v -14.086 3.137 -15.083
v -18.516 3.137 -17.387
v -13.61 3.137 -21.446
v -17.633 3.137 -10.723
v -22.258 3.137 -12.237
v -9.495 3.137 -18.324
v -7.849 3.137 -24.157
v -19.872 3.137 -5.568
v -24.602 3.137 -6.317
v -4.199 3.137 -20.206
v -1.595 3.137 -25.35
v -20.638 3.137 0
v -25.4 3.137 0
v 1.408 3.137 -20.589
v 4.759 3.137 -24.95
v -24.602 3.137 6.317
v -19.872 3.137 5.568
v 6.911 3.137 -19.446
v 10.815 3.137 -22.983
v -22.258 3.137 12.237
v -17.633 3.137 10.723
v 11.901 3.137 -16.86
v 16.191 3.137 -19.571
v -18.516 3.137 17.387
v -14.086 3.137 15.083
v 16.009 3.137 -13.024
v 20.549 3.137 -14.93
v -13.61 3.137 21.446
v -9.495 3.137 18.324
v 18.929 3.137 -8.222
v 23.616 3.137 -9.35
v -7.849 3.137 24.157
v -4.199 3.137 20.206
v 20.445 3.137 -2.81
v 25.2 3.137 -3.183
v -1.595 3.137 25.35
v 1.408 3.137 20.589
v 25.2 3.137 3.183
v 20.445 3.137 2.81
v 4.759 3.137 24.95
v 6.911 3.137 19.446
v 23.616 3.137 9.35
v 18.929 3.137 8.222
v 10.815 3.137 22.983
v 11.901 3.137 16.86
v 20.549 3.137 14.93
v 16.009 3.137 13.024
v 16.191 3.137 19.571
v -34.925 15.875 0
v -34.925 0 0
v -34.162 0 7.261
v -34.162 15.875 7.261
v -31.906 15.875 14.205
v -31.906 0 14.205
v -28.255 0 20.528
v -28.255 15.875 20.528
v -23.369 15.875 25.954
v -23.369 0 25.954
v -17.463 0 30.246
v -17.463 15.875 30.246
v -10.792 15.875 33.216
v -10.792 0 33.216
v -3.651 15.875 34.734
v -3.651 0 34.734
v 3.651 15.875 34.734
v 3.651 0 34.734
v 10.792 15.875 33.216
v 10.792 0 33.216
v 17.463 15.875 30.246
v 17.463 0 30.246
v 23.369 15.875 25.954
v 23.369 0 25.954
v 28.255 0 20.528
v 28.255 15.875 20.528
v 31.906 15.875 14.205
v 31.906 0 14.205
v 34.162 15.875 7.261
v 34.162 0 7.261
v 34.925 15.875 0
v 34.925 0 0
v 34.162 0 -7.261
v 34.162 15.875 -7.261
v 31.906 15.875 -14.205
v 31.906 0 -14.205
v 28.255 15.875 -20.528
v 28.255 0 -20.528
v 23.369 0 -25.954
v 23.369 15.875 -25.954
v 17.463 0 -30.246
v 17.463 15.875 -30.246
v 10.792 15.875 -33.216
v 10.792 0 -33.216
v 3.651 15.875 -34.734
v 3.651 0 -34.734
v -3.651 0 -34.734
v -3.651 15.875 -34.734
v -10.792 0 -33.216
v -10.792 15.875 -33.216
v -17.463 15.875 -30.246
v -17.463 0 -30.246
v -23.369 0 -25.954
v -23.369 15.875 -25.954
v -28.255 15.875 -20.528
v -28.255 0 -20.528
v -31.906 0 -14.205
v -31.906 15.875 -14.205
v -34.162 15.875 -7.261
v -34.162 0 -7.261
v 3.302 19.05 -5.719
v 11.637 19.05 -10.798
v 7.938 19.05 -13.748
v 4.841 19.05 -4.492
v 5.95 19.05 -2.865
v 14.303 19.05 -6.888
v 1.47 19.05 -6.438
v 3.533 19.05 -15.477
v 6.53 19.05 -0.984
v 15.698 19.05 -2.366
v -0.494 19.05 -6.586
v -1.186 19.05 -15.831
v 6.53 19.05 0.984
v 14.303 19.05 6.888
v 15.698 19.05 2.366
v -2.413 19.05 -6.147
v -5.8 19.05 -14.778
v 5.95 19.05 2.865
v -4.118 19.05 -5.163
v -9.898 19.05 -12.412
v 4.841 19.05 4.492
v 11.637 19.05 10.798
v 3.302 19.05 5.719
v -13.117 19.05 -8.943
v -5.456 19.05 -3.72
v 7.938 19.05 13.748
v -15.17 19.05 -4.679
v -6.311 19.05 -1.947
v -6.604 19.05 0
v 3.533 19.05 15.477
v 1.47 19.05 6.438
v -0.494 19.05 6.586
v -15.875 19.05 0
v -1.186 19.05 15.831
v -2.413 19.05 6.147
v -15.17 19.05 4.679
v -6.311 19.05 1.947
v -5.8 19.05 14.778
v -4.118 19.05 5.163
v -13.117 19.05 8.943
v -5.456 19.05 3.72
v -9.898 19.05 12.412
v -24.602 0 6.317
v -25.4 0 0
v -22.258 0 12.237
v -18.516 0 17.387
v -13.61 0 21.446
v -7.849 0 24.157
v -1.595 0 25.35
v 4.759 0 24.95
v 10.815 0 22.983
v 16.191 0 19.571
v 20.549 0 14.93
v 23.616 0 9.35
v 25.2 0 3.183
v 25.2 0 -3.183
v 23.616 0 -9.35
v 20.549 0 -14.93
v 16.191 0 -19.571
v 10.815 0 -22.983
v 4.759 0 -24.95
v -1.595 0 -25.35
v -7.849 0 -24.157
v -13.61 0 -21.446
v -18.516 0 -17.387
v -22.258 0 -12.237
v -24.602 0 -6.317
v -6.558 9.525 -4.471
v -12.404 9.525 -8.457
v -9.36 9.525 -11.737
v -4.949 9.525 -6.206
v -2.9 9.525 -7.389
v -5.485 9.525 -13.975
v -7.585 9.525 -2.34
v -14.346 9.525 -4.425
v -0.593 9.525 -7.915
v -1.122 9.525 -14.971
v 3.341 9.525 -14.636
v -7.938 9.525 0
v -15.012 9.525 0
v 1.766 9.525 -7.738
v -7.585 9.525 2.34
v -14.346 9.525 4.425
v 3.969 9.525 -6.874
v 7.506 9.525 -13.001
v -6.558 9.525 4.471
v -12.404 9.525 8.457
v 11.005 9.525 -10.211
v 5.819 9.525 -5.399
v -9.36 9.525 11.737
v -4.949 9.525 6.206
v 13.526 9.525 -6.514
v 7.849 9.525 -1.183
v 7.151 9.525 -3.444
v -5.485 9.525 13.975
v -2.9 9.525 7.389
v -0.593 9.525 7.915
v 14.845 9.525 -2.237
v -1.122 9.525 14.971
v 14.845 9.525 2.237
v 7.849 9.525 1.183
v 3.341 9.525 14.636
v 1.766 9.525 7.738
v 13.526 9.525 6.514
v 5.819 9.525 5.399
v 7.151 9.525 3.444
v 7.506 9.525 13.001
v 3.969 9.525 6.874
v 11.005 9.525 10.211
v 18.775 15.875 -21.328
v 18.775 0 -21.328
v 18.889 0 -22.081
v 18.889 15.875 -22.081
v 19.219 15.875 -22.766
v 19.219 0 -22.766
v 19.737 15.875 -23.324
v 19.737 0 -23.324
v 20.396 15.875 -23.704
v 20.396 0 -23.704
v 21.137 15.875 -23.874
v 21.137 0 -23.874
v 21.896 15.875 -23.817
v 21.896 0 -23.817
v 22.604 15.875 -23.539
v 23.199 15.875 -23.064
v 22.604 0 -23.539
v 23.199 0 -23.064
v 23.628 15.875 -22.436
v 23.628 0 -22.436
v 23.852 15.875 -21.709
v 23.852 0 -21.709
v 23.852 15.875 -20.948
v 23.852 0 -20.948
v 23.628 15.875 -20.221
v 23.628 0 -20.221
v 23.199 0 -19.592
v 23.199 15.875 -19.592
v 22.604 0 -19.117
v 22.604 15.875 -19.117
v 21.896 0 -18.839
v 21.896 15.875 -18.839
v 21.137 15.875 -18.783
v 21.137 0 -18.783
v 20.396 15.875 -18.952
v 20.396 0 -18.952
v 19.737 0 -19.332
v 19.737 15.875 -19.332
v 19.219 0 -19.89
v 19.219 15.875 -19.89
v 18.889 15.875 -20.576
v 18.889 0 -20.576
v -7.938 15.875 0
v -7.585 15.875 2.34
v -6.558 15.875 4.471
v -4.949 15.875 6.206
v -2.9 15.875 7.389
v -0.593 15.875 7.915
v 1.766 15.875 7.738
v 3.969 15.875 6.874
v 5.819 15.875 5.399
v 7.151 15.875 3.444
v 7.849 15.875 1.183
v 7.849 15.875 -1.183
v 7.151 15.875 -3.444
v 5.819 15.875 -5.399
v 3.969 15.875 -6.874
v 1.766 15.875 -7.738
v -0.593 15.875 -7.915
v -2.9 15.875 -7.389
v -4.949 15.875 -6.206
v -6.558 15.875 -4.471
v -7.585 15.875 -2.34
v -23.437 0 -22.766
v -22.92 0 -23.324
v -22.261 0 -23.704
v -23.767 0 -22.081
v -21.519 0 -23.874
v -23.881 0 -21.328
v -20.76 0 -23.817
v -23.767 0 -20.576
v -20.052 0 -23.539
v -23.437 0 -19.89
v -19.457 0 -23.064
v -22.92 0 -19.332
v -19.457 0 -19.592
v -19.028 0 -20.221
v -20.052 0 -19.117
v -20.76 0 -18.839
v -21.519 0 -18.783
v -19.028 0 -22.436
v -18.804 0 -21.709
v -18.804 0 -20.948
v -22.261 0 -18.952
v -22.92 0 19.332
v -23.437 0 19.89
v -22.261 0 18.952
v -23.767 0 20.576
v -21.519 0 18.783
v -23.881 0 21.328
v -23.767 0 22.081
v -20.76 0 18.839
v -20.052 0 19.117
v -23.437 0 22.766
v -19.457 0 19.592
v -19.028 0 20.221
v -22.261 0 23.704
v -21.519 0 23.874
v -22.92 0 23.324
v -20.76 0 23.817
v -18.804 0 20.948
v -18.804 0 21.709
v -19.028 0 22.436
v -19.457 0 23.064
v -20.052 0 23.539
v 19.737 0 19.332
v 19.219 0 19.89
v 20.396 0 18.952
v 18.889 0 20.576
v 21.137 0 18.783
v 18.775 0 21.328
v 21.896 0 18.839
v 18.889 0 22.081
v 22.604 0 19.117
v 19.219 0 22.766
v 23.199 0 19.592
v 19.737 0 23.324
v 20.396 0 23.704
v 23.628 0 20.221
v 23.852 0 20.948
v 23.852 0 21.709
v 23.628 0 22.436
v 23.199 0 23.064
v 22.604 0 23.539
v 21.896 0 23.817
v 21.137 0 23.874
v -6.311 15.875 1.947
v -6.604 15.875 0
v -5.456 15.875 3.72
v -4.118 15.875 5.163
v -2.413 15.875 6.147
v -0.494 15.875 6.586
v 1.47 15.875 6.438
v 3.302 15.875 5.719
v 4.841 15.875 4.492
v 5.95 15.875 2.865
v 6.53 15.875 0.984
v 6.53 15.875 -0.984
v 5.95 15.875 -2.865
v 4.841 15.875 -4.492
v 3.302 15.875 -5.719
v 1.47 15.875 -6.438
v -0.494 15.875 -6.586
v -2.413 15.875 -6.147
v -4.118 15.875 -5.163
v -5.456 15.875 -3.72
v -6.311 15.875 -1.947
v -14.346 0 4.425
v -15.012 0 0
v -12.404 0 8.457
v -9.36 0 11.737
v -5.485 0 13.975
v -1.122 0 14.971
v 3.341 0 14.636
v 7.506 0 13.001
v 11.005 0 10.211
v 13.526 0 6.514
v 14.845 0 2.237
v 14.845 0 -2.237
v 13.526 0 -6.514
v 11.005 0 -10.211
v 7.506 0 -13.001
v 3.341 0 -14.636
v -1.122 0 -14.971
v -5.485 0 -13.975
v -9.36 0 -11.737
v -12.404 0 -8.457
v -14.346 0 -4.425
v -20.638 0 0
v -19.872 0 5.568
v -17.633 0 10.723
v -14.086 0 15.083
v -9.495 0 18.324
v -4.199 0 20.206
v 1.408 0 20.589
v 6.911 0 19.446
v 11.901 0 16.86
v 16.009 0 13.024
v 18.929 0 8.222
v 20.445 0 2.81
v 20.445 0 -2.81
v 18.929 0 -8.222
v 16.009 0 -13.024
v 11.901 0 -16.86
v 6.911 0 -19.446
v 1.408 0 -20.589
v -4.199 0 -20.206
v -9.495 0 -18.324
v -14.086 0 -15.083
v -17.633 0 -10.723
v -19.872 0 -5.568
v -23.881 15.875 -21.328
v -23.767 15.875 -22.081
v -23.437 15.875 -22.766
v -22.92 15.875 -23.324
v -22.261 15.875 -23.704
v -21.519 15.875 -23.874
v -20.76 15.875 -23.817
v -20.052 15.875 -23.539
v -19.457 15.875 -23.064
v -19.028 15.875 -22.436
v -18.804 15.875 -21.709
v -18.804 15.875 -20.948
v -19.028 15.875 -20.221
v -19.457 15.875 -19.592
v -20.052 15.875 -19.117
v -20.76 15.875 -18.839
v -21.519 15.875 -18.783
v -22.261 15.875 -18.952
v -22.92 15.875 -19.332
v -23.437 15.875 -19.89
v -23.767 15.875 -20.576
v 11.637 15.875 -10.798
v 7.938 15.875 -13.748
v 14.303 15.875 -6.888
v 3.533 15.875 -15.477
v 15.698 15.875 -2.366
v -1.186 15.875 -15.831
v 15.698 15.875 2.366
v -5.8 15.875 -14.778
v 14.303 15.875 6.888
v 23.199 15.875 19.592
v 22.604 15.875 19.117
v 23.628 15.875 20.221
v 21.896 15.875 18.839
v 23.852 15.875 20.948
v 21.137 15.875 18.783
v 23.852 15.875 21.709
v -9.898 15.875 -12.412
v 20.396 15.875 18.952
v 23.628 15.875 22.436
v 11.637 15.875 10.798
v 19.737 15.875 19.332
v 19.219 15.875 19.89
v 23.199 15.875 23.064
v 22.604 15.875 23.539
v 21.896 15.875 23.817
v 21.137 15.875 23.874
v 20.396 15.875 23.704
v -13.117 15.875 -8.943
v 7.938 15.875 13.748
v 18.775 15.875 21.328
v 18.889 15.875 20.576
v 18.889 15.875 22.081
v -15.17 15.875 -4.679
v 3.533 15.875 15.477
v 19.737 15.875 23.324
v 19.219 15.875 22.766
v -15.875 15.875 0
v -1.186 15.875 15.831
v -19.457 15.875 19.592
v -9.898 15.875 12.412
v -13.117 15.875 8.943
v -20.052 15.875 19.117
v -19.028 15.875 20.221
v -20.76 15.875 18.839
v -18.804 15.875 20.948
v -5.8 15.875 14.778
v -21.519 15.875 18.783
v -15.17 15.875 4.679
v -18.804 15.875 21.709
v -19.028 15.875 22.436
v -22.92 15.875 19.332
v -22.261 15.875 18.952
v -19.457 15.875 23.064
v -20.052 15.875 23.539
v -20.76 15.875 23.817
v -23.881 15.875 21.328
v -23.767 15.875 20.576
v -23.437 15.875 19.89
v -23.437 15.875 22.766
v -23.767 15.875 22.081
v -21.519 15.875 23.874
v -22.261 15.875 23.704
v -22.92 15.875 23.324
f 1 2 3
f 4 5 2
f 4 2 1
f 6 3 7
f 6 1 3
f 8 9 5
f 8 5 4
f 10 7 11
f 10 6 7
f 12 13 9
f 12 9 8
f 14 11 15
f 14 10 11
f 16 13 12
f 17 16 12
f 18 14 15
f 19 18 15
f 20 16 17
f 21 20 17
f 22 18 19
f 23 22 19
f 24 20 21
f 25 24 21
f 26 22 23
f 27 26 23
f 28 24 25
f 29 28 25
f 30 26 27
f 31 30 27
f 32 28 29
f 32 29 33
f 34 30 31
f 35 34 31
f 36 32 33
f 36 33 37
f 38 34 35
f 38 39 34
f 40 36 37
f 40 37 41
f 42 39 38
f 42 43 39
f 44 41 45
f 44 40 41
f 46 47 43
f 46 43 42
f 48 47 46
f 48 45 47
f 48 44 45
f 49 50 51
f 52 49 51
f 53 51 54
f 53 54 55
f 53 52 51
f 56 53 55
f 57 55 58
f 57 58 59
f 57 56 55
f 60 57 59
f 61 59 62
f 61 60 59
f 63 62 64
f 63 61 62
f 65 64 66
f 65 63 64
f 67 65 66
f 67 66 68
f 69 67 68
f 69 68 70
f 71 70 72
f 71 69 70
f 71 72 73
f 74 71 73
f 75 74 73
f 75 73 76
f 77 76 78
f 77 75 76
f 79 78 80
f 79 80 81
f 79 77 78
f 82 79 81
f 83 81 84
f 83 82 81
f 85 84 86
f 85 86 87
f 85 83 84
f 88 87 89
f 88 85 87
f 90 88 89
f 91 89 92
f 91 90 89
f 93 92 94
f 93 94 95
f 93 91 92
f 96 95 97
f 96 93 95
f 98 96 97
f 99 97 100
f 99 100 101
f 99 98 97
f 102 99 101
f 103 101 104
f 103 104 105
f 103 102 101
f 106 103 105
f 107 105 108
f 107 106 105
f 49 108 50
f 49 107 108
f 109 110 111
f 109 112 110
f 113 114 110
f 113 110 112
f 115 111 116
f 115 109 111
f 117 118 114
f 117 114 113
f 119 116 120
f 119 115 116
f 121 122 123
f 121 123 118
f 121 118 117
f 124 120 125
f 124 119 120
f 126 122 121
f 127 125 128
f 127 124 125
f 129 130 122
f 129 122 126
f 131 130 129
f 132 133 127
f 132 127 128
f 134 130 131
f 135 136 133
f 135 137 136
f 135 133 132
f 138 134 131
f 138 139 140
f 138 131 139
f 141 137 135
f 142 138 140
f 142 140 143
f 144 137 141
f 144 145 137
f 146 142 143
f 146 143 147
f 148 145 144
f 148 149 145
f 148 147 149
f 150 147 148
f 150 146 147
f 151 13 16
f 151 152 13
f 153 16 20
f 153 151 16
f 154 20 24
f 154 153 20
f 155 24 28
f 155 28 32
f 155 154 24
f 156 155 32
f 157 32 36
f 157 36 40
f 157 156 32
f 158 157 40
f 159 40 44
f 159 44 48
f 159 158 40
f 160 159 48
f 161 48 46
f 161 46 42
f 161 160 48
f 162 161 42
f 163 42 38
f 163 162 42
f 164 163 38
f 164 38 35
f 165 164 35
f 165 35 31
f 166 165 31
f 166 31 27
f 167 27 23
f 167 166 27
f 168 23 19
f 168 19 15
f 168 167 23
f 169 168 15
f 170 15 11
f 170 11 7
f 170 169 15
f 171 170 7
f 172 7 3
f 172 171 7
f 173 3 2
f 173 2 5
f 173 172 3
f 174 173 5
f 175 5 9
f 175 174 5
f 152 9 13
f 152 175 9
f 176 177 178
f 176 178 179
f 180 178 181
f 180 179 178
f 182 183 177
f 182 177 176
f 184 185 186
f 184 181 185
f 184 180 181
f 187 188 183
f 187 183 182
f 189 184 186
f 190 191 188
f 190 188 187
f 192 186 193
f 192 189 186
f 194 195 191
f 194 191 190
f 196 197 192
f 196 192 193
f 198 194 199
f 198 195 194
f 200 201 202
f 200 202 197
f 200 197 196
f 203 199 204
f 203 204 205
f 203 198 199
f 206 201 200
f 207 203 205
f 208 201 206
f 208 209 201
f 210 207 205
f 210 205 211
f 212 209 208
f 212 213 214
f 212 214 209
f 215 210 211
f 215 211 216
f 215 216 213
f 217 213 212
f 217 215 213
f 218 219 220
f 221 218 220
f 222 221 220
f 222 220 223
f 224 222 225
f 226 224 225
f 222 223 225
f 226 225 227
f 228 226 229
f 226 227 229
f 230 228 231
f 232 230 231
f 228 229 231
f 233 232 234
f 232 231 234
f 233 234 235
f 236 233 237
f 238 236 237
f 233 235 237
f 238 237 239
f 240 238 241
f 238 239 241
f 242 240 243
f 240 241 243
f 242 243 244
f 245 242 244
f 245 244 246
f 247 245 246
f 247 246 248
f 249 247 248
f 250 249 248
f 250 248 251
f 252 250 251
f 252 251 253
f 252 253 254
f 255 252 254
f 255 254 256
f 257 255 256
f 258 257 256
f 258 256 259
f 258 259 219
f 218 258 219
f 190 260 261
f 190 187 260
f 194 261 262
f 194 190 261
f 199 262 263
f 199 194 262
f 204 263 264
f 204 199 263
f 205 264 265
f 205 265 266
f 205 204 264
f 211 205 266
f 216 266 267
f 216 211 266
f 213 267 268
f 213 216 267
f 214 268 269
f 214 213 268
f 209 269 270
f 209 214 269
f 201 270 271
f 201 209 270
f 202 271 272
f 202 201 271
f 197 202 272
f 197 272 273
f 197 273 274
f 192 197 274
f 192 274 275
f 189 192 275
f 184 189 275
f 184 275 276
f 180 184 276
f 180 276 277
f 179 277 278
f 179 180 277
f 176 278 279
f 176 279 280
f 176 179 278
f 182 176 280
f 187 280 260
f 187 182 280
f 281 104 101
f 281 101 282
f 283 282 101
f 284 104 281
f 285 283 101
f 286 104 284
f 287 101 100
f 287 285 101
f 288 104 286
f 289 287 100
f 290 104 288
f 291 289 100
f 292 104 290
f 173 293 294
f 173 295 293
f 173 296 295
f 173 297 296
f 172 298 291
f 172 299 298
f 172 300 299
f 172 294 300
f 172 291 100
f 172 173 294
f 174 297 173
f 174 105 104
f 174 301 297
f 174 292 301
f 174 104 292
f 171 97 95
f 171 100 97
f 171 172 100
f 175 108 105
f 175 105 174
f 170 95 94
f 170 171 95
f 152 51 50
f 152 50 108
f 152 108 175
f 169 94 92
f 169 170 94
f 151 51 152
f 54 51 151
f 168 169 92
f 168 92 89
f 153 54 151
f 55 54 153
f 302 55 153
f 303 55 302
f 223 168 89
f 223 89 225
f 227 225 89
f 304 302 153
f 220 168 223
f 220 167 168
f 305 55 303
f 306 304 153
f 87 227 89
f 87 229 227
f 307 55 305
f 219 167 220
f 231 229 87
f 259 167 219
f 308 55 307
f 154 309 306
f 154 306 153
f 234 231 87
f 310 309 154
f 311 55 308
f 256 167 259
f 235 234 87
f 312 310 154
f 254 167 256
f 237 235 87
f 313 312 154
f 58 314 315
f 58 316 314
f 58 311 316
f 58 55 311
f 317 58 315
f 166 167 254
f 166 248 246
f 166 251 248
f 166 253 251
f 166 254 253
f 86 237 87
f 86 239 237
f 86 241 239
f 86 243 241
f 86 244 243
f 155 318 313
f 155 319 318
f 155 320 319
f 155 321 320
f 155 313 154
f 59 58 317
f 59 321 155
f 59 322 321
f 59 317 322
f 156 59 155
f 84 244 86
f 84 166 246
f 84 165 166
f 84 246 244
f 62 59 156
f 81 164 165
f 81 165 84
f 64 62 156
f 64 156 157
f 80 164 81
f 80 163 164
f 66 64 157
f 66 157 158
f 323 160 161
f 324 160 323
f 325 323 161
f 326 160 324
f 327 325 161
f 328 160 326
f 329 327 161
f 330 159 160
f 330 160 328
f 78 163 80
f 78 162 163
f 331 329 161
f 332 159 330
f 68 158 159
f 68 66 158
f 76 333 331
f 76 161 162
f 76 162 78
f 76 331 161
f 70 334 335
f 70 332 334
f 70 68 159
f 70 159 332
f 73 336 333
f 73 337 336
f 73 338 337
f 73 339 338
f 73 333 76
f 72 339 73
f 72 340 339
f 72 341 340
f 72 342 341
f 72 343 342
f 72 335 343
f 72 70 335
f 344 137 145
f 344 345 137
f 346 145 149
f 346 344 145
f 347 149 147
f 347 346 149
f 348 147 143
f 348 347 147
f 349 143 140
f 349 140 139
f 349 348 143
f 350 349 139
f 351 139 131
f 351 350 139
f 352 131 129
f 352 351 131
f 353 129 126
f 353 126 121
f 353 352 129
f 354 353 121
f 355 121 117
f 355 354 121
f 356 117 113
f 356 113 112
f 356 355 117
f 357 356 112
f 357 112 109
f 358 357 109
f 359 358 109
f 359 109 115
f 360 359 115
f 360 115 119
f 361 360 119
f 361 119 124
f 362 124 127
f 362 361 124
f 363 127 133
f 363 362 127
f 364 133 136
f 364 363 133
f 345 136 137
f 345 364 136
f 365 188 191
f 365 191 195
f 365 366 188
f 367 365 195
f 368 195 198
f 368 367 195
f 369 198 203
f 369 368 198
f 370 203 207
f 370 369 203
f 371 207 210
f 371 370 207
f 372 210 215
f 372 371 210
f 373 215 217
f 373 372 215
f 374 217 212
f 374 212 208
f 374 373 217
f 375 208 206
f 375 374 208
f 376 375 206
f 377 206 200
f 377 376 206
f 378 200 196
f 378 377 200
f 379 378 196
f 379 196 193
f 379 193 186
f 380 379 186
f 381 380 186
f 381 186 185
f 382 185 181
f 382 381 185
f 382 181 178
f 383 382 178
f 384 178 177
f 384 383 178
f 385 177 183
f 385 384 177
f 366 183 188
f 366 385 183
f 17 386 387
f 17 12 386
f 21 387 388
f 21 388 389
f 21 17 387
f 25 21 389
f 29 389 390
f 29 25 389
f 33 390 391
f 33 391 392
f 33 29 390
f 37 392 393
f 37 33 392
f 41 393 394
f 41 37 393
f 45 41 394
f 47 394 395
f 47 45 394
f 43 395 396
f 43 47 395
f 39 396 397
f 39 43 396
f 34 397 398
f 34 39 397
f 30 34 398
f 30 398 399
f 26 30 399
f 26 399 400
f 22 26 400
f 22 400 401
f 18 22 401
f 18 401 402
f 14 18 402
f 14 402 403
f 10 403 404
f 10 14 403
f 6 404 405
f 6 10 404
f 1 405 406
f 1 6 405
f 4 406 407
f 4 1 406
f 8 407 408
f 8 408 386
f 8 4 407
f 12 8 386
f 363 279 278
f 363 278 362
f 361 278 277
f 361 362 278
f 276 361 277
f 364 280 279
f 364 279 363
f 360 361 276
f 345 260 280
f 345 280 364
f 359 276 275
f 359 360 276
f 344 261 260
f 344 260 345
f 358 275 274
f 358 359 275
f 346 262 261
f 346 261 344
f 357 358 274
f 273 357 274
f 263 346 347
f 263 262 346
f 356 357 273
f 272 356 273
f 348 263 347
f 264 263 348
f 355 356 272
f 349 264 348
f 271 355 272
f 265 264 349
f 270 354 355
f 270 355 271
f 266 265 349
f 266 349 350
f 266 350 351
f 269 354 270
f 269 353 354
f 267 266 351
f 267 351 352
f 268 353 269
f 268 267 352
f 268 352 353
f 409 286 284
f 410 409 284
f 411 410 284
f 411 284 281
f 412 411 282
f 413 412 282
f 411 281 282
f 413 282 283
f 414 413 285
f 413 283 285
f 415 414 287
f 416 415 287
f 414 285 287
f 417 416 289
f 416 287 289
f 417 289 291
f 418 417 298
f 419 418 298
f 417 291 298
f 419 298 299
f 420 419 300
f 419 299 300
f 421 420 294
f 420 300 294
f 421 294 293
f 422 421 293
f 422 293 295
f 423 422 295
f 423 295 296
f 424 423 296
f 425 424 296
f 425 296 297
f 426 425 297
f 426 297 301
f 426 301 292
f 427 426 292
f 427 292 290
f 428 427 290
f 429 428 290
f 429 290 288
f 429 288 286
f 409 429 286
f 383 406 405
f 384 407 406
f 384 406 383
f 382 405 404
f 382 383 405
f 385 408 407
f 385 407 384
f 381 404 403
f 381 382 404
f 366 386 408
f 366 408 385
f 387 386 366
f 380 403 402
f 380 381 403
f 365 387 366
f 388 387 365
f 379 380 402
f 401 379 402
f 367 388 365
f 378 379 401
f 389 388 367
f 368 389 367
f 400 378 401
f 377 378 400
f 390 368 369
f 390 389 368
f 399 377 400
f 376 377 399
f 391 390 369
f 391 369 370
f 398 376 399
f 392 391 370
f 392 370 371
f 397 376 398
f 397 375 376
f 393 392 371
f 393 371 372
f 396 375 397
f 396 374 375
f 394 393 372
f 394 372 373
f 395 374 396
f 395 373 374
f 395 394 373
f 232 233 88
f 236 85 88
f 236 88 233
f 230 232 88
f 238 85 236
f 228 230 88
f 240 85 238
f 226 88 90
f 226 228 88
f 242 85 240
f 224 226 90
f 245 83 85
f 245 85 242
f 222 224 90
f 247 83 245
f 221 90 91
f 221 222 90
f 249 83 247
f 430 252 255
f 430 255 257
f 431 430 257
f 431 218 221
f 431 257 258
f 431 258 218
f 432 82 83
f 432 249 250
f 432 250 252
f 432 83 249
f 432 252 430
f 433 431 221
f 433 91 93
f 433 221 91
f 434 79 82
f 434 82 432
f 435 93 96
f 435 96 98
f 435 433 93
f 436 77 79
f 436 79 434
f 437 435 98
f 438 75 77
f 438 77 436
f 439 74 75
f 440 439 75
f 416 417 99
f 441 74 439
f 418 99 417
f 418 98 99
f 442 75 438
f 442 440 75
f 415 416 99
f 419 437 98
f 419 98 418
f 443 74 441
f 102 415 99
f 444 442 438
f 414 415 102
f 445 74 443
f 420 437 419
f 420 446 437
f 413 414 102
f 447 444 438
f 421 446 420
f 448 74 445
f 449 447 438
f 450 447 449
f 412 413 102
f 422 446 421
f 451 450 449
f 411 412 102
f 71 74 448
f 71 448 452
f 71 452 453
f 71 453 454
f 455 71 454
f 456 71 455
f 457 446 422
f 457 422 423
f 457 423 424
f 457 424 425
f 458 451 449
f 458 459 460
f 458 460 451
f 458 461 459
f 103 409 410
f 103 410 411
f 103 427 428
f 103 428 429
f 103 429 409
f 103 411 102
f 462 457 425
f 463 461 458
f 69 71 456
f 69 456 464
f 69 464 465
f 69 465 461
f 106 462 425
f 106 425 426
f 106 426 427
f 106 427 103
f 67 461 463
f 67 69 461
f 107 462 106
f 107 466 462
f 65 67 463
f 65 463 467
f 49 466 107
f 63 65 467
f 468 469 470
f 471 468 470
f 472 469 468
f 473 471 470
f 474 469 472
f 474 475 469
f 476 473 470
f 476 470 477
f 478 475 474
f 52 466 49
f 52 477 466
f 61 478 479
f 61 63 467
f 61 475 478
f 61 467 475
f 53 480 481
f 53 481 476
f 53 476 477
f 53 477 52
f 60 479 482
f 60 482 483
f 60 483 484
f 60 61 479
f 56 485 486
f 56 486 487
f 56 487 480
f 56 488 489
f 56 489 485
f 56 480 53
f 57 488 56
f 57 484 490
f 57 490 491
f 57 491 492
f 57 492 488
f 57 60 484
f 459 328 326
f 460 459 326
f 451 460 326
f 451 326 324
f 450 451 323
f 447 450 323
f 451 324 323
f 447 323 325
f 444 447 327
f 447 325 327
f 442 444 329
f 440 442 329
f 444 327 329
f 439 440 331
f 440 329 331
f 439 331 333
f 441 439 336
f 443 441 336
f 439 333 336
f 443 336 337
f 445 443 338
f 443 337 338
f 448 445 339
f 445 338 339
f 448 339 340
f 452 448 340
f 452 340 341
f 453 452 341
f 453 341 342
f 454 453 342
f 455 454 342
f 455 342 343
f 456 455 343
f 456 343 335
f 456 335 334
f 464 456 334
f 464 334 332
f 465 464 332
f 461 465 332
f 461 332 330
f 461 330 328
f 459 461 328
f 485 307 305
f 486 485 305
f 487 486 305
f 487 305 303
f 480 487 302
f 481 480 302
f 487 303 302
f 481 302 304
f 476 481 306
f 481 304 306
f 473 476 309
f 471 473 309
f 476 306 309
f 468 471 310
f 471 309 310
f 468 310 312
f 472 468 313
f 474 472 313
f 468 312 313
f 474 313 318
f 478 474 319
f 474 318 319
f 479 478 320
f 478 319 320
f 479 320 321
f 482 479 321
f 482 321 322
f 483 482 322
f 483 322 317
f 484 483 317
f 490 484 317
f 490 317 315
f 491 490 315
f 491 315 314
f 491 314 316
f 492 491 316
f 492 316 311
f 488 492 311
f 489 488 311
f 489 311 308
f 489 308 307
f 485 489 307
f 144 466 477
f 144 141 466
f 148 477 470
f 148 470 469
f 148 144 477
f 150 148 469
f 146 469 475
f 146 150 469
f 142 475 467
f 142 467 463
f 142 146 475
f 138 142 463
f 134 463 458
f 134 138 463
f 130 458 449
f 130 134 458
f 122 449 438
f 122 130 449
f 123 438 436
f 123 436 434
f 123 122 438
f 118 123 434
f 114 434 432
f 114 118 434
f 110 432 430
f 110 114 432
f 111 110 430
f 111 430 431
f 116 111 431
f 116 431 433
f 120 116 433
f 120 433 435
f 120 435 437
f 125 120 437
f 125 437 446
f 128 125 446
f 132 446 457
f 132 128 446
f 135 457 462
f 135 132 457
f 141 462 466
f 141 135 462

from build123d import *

# Parameters (mm, degrees)
F_10_CLEARANCE_HOLE1_D = 5.1054


with BuildPart() as part:
    # Sketch1 → Revolve1 (revolve)
    with BuildSketch(Plane.XY):
        Polygon((-15.875, 19.05), (-6.604, 19.05), (-6.604, 15.875), (-7.9375, 15.875), (-7.9375, 9.525), (-15.0125, 9.525), (-15.0125, 0), (-20.6375, 0), (-20.6375, 3.1369), (-25.4, 3.1369), (-25.4, 0), (-34.925, 0), (-34.925, 15.875), (-15.875, 15.875), align=None)
    revolve(axis=Axis((0, 0, 0), (0, 1, 0)))

    # #10 Clearance Hole1 (through all)
    with Locations(Plane(origin=(0, 15.875, 0), x_dir=(1, 0, 0), z_dir=(0, 1, 0))):
        with Locations((-21.328108288, 21.328108288), (21.328108288, 21.328108288), (21.328108288, -21.328108288), (-21.328108288, -21.328108288)):
            Hole(F_10_CLEARANCE_HOLE1_D / 2)


solid = part.part
